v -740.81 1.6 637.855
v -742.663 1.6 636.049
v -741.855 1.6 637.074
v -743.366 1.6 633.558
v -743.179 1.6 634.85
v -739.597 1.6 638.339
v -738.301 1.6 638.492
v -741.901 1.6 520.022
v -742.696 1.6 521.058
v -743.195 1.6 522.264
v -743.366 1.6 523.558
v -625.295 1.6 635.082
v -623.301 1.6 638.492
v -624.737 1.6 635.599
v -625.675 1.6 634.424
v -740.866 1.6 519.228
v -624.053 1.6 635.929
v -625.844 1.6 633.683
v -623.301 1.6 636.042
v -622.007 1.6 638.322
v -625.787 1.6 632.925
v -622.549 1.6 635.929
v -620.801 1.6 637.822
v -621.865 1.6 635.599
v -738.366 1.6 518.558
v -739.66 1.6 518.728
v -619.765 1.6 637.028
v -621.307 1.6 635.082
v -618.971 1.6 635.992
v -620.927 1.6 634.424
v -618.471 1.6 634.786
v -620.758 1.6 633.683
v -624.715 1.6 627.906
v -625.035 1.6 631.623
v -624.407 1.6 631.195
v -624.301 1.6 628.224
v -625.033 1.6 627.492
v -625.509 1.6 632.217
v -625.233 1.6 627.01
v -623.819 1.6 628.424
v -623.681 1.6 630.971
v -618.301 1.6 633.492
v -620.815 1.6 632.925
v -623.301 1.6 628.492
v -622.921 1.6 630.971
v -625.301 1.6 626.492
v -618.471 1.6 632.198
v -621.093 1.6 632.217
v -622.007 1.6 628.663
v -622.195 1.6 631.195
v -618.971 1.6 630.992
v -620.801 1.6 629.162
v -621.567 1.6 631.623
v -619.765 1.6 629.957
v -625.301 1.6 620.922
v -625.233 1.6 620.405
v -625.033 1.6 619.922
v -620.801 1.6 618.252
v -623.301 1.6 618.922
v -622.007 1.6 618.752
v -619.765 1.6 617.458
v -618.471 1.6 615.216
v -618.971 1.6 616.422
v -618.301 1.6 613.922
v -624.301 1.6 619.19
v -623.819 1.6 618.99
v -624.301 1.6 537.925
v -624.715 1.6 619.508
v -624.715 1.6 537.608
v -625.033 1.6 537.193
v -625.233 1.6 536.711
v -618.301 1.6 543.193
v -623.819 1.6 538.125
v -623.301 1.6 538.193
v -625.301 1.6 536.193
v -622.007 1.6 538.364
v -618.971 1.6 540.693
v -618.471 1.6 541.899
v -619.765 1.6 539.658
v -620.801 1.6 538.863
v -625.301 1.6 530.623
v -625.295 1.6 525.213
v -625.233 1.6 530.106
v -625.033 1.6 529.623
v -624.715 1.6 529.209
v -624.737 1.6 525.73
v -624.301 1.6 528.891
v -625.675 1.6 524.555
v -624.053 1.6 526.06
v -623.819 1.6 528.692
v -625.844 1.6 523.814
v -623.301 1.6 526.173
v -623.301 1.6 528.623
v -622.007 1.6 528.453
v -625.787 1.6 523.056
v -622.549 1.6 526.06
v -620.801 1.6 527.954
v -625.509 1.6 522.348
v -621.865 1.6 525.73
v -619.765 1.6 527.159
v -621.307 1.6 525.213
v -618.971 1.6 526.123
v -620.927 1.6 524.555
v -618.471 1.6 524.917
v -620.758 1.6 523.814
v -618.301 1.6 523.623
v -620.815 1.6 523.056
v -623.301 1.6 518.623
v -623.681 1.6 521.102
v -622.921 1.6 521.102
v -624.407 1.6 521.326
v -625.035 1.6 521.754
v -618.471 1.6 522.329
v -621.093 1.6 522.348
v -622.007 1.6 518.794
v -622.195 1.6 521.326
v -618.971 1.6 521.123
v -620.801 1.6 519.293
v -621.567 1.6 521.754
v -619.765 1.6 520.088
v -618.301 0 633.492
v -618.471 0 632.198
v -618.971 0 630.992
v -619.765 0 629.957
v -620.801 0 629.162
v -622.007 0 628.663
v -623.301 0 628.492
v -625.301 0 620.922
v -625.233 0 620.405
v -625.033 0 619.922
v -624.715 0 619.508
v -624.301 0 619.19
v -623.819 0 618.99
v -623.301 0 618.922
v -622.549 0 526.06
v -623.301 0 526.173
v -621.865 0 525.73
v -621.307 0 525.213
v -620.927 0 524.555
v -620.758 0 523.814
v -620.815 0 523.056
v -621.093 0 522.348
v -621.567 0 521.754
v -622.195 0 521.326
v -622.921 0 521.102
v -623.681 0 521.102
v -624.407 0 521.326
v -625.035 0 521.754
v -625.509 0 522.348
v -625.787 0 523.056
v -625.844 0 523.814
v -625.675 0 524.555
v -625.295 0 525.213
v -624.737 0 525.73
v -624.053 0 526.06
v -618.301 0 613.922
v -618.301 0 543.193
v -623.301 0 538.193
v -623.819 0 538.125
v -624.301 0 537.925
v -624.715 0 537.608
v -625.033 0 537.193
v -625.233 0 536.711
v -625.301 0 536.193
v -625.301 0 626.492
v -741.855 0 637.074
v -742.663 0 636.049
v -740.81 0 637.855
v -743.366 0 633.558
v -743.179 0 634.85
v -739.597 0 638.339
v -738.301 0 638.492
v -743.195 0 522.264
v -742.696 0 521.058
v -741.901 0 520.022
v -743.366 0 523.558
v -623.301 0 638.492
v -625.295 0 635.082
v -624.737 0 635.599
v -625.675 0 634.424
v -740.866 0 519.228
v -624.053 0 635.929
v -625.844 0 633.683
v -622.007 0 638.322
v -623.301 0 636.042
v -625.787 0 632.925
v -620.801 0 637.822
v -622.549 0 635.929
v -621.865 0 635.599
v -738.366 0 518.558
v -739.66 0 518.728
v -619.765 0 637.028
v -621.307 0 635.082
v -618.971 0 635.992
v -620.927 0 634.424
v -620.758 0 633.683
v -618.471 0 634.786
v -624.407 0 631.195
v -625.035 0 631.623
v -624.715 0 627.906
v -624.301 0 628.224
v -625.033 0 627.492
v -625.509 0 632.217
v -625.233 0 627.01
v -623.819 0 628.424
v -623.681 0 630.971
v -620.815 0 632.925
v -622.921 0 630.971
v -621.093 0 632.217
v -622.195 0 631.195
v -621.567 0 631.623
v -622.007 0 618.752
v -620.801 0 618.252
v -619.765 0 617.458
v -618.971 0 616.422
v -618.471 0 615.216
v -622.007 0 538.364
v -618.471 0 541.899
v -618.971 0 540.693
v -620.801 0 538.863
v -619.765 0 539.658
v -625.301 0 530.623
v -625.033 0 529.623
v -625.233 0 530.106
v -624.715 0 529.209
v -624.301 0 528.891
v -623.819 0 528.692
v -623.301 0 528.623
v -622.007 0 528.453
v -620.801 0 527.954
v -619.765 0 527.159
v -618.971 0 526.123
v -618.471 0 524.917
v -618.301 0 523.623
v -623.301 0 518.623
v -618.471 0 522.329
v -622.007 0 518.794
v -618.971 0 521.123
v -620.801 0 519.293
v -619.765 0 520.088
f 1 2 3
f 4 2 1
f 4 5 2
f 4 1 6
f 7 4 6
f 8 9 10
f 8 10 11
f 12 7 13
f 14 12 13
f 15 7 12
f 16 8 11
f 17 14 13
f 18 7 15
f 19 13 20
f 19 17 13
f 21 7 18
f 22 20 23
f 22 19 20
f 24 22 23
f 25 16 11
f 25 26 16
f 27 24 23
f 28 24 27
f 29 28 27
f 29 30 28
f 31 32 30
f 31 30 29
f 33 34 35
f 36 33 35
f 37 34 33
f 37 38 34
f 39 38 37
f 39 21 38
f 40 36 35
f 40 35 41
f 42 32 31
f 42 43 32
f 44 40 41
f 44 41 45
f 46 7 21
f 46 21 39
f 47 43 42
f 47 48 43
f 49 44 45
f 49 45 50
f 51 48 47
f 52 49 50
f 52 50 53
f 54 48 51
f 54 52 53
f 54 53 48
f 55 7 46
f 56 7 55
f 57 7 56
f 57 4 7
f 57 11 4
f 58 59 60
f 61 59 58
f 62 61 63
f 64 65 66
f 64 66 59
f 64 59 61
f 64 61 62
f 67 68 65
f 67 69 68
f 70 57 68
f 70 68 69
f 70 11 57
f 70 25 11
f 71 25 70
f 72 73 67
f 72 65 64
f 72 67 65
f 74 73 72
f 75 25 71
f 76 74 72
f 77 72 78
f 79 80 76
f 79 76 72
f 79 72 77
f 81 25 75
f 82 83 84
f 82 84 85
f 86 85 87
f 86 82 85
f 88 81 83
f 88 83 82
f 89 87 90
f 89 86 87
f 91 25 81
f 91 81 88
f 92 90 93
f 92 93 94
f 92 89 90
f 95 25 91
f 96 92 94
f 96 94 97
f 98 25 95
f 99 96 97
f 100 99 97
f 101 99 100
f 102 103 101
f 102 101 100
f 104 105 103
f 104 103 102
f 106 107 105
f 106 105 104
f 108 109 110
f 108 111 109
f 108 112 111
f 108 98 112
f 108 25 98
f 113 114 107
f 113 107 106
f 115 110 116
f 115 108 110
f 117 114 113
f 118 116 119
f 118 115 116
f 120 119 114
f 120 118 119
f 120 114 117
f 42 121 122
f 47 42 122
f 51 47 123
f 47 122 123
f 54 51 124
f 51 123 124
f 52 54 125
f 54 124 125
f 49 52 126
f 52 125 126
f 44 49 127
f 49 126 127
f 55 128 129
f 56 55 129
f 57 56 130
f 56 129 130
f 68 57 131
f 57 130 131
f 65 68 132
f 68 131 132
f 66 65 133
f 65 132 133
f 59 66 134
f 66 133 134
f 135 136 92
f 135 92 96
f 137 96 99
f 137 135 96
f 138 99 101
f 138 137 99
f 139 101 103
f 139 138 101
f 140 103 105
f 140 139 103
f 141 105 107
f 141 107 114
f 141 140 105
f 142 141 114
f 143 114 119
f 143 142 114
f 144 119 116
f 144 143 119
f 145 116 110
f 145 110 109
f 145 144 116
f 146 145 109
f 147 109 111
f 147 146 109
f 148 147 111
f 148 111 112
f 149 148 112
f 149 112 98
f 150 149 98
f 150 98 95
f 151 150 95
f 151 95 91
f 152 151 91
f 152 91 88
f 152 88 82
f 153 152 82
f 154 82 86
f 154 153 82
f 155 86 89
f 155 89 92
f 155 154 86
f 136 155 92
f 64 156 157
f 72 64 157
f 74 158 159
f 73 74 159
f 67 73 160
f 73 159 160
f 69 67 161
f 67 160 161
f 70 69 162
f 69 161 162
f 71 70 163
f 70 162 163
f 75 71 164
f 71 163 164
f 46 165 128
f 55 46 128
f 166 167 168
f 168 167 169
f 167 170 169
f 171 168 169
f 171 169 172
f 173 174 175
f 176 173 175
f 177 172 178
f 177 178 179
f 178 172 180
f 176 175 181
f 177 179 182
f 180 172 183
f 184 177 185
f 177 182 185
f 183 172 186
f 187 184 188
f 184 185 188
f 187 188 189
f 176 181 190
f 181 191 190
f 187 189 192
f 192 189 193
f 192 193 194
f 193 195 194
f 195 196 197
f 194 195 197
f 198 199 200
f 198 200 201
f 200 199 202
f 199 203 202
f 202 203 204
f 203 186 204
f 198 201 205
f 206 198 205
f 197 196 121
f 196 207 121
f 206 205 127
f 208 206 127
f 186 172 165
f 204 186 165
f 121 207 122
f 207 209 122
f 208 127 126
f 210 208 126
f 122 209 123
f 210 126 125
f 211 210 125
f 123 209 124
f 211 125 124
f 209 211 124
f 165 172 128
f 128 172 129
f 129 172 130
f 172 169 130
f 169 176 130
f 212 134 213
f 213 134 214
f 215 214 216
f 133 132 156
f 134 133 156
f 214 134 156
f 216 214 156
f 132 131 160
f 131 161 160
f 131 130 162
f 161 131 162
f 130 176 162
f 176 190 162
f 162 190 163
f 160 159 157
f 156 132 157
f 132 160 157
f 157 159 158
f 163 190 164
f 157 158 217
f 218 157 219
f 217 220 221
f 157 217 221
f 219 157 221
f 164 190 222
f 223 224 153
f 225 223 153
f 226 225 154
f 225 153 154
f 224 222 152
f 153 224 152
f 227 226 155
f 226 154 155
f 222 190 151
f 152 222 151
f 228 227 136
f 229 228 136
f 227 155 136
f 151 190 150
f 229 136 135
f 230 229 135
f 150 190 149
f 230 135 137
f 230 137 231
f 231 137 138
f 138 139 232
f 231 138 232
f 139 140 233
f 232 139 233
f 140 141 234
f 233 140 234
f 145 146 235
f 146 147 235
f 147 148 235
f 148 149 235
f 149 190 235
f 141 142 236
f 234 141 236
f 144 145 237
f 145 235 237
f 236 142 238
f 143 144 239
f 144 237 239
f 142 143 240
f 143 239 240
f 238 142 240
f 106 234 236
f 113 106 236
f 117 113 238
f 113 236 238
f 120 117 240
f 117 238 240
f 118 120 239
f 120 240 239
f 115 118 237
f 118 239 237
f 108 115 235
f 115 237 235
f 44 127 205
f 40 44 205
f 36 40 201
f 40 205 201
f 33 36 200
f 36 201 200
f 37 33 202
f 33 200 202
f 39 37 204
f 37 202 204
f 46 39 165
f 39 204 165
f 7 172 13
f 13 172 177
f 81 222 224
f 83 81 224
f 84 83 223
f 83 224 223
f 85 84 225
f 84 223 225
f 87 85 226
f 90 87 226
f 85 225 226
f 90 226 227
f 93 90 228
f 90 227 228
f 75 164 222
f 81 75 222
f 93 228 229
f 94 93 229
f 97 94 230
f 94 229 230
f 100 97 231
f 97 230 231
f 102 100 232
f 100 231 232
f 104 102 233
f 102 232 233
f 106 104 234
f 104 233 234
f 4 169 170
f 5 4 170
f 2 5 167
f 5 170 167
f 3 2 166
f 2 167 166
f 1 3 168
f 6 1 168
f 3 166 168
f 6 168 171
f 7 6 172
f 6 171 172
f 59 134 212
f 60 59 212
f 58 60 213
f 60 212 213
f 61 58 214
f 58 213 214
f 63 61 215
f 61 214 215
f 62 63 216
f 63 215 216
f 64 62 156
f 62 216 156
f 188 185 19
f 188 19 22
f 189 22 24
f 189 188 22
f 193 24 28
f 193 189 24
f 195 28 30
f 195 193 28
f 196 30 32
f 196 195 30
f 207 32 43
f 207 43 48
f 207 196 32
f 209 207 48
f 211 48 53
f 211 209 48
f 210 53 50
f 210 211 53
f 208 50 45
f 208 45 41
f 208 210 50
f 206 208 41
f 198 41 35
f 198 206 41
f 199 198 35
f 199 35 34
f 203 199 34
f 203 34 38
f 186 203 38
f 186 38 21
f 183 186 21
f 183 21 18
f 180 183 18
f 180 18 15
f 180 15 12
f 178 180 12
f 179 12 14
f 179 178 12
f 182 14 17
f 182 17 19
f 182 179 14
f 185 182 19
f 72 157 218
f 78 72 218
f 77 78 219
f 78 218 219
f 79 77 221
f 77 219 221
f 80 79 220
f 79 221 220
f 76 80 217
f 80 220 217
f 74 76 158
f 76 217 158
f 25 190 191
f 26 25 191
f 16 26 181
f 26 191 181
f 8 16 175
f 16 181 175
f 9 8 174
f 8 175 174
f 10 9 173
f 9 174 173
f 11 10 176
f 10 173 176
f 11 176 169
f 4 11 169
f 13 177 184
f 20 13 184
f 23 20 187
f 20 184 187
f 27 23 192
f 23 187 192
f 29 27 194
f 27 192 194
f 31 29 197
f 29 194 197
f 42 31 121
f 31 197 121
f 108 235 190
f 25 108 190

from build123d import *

# Parameters (mm, degrees)
SKETCH_1_R      = 2.55
EXTRUDE_1_DEPTH = 1.6


with BuildPart() as part:
    # 草图1 → 凸台-拉伸1 (new body)
    with BuildSketch(Plane(origin=(0, 0, 0), x_dir=(1, 0, 0), z_dir=(0, 1, 0))):
        with BuildLine():
            Line((-738.301002862, -638.492276663), (-623.301002862, -638.492276663))
            ThreePointArc((-623.301002862, -638.492276663), (-619.765468956, -637.027810569), (-618.301002862, -633.492276663))
            ThreePointArc((-618.301002862, -633.492276663), (-619.765468956, -629.956742757), (-623.301002862, -628.492276663))
            ThreePointArc((-623.301002862, -628.492276663), (-624.715216424, -627.906490225), (-625.301002862, -626.492276663))
            Line((-625.301002862, -626.492276663), (-625.301002862, -620.922276663))
            ThreePointArc((-625.301002862, -620.922276663), (-624.715216424, -619.5080631), (-623.301002862, -618.922276663))
            ThreePointArc((-623.301002862, -618.922276663), (-619.765468956, -617.457810569), (-618.301002862, -613.922276663))
            Line((-618.301002862, -613.922276663), (-618.301002862, -543.193402957))
            ThreePointArc((-618.301002862, -543.193402957), (-619.765468956, -539.657869051), (-623.301002862, -538.193402957))
            ThreePointArc((-623.301002862, -538.193402957), (-624.715216424, -537.607616519), (-625.301002862, -536.193402957))
            Line((-625.301002862, -536.193402957), (-625.301002862, -530.623402957))
            ThreePointArc((-625.301002862, -530.623402957), (-624.715216424, -529.209189395), (-623.301002862, -528.623402957))
            ThreePointArc((-623.301002862, -528.623402957), (-619.765468956, -527.158936863), (-618.301002862, -523.623402957))
            ThreePointArc((-618.301002862, -523.623402957), (-619.765468956, -520.087869051), (-623.301002862, -518.623402957))
            Line((-623.301002862, -518.623402957), (-738.36571736, -518.55783981))
            ThreePointArc((-738.36571736, -518.55783981), (-741.901251266, -520.022305904), (-743.36571736, -523.55783981))
            Line((-743.36571736, -523.55783981), (-743.36571736, -633.55783981))
            ThreePointArc((-743.36571736, -633.55783981), (-741.855315445, -637.073994954), (-738.301002862, -638.492276663))
        make_face()
        with Locations(Location((-623.301002862, -633.492276663, 0), (0, 0, 270))):
            Circle(SKETCH_1_R, mode=Mode.SUBTRACT)
        with Locations(Location((-623.301002862, -523.623402957, 0), (0, 0, 270))):
            Circle(SKETCH_1_R, mode=Mode.SUBTRACT)
    extrude(amount=EXTRUDE_1_DEPTH)


solid = part.part
